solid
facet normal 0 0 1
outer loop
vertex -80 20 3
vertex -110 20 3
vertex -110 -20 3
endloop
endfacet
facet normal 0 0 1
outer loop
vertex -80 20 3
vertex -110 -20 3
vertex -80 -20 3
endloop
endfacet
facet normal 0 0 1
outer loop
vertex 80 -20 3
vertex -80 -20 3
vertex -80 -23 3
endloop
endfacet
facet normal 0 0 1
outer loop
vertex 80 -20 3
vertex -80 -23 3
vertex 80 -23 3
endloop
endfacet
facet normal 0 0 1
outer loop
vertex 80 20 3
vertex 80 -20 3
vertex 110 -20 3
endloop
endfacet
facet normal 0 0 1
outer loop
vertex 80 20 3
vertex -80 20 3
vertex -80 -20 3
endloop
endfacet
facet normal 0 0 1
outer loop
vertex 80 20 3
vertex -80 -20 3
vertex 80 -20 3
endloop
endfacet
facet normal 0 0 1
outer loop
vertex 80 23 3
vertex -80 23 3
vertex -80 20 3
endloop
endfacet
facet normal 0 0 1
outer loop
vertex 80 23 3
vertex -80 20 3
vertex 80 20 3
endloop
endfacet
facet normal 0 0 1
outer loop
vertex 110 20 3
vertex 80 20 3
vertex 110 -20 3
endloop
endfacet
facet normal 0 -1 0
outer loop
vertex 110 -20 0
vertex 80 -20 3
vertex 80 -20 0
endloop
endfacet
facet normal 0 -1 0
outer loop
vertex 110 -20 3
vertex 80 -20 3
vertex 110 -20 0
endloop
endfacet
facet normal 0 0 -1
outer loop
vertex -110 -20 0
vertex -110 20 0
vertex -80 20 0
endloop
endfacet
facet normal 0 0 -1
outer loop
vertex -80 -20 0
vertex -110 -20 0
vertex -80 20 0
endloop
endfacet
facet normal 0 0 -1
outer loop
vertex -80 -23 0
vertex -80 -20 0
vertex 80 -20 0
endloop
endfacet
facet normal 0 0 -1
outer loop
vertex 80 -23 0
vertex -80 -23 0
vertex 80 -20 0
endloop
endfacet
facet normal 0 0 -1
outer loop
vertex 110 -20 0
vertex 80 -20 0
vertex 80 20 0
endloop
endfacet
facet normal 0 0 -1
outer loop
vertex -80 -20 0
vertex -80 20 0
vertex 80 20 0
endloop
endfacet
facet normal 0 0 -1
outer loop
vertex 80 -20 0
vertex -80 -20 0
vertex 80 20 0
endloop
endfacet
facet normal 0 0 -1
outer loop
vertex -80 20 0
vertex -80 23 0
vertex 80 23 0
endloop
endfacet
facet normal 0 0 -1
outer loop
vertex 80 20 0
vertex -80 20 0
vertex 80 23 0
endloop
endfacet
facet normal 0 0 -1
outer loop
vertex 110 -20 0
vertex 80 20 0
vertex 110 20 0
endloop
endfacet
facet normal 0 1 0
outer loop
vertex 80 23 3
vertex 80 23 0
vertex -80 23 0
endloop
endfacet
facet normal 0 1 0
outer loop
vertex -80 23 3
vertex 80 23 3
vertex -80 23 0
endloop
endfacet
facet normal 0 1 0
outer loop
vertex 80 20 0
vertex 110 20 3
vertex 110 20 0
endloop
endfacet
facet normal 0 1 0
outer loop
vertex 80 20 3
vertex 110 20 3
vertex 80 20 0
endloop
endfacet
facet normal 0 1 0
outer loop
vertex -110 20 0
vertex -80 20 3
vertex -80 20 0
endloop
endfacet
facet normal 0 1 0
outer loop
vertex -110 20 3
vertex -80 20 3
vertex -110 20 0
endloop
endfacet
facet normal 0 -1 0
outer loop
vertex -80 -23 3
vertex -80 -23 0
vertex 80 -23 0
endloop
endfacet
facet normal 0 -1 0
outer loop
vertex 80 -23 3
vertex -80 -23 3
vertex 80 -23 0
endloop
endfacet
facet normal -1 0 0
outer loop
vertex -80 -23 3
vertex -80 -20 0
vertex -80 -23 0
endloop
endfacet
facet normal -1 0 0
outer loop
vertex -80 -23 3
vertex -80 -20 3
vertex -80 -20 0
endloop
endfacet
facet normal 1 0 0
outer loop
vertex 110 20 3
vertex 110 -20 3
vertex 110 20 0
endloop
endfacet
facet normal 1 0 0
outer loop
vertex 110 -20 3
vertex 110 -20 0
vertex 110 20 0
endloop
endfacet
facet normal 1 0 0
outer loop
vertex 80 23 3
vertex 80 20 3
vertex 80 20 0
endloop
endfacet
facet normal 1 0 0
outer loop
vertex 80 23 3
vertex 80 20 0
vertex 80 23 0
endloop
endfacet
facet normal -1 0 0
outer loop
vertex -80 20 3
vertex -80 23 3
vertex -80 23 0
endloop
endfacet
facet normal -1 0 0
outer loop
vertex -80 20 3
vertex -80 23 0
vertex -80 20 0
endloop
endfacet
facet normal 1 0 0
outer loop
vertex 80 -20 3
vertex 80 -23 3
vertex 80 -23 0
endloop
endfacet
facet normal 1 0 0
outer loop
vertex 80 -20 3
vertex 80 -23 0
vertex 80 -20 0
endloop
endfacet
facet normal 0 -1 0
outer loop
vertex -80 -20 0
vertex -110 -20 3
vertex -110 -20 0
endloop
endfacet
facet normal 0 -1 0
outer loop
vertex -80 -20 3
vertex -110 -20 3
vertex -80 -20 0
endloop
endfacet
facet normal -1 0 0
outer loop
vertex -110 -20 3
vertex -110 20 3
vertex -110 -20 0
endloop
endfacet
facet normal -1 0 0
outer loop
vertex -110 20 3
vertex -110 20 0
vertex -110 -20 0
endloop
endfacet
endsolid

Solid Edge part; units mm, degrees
sketch "Sketch1" plane through (0, 0, 0) normal (0, 0, 1) x (1, 0, 0)
  line L0 (-110, -23) -> (110, -23)
  line L1 (110, -23) -> (110, 23)
  line L2 (110, 23) -> (-110, 23)
  line L3 (-110, 23) -> (-110, -23)
  dimension "D1" = 220
  dimension "D2" = 46
extrude "Ajout_matière_1" add sketch "Sketch1" along normal blind 3
sketch "Sketch2" plane through (0, 0, 3) normal (0, 0, 1) x (1, 0, 0)
  line L0 (-110, 23) -> (-80, 23)
  line L1 (-80, 23) -> (-80, 20)
  line L2 (-80, 20) -> (-110, 20)
  line L3 (-110, 20) -> (-110, 23)
  dimension "D1" = 3
  dimension "D2" = 30
extrude "Cutout1" cut sketch "Sketch2" against normal through all
mirror "Mirror1" about plane through (0, 0, 0) normal (1, 0, 0) of "Cutout1"
mirror "Mirror2" about plane through (0, 0, 0) normal (0, -1, 0) of "Mirror1", "Cutout1"
properties material "Acier S235"
